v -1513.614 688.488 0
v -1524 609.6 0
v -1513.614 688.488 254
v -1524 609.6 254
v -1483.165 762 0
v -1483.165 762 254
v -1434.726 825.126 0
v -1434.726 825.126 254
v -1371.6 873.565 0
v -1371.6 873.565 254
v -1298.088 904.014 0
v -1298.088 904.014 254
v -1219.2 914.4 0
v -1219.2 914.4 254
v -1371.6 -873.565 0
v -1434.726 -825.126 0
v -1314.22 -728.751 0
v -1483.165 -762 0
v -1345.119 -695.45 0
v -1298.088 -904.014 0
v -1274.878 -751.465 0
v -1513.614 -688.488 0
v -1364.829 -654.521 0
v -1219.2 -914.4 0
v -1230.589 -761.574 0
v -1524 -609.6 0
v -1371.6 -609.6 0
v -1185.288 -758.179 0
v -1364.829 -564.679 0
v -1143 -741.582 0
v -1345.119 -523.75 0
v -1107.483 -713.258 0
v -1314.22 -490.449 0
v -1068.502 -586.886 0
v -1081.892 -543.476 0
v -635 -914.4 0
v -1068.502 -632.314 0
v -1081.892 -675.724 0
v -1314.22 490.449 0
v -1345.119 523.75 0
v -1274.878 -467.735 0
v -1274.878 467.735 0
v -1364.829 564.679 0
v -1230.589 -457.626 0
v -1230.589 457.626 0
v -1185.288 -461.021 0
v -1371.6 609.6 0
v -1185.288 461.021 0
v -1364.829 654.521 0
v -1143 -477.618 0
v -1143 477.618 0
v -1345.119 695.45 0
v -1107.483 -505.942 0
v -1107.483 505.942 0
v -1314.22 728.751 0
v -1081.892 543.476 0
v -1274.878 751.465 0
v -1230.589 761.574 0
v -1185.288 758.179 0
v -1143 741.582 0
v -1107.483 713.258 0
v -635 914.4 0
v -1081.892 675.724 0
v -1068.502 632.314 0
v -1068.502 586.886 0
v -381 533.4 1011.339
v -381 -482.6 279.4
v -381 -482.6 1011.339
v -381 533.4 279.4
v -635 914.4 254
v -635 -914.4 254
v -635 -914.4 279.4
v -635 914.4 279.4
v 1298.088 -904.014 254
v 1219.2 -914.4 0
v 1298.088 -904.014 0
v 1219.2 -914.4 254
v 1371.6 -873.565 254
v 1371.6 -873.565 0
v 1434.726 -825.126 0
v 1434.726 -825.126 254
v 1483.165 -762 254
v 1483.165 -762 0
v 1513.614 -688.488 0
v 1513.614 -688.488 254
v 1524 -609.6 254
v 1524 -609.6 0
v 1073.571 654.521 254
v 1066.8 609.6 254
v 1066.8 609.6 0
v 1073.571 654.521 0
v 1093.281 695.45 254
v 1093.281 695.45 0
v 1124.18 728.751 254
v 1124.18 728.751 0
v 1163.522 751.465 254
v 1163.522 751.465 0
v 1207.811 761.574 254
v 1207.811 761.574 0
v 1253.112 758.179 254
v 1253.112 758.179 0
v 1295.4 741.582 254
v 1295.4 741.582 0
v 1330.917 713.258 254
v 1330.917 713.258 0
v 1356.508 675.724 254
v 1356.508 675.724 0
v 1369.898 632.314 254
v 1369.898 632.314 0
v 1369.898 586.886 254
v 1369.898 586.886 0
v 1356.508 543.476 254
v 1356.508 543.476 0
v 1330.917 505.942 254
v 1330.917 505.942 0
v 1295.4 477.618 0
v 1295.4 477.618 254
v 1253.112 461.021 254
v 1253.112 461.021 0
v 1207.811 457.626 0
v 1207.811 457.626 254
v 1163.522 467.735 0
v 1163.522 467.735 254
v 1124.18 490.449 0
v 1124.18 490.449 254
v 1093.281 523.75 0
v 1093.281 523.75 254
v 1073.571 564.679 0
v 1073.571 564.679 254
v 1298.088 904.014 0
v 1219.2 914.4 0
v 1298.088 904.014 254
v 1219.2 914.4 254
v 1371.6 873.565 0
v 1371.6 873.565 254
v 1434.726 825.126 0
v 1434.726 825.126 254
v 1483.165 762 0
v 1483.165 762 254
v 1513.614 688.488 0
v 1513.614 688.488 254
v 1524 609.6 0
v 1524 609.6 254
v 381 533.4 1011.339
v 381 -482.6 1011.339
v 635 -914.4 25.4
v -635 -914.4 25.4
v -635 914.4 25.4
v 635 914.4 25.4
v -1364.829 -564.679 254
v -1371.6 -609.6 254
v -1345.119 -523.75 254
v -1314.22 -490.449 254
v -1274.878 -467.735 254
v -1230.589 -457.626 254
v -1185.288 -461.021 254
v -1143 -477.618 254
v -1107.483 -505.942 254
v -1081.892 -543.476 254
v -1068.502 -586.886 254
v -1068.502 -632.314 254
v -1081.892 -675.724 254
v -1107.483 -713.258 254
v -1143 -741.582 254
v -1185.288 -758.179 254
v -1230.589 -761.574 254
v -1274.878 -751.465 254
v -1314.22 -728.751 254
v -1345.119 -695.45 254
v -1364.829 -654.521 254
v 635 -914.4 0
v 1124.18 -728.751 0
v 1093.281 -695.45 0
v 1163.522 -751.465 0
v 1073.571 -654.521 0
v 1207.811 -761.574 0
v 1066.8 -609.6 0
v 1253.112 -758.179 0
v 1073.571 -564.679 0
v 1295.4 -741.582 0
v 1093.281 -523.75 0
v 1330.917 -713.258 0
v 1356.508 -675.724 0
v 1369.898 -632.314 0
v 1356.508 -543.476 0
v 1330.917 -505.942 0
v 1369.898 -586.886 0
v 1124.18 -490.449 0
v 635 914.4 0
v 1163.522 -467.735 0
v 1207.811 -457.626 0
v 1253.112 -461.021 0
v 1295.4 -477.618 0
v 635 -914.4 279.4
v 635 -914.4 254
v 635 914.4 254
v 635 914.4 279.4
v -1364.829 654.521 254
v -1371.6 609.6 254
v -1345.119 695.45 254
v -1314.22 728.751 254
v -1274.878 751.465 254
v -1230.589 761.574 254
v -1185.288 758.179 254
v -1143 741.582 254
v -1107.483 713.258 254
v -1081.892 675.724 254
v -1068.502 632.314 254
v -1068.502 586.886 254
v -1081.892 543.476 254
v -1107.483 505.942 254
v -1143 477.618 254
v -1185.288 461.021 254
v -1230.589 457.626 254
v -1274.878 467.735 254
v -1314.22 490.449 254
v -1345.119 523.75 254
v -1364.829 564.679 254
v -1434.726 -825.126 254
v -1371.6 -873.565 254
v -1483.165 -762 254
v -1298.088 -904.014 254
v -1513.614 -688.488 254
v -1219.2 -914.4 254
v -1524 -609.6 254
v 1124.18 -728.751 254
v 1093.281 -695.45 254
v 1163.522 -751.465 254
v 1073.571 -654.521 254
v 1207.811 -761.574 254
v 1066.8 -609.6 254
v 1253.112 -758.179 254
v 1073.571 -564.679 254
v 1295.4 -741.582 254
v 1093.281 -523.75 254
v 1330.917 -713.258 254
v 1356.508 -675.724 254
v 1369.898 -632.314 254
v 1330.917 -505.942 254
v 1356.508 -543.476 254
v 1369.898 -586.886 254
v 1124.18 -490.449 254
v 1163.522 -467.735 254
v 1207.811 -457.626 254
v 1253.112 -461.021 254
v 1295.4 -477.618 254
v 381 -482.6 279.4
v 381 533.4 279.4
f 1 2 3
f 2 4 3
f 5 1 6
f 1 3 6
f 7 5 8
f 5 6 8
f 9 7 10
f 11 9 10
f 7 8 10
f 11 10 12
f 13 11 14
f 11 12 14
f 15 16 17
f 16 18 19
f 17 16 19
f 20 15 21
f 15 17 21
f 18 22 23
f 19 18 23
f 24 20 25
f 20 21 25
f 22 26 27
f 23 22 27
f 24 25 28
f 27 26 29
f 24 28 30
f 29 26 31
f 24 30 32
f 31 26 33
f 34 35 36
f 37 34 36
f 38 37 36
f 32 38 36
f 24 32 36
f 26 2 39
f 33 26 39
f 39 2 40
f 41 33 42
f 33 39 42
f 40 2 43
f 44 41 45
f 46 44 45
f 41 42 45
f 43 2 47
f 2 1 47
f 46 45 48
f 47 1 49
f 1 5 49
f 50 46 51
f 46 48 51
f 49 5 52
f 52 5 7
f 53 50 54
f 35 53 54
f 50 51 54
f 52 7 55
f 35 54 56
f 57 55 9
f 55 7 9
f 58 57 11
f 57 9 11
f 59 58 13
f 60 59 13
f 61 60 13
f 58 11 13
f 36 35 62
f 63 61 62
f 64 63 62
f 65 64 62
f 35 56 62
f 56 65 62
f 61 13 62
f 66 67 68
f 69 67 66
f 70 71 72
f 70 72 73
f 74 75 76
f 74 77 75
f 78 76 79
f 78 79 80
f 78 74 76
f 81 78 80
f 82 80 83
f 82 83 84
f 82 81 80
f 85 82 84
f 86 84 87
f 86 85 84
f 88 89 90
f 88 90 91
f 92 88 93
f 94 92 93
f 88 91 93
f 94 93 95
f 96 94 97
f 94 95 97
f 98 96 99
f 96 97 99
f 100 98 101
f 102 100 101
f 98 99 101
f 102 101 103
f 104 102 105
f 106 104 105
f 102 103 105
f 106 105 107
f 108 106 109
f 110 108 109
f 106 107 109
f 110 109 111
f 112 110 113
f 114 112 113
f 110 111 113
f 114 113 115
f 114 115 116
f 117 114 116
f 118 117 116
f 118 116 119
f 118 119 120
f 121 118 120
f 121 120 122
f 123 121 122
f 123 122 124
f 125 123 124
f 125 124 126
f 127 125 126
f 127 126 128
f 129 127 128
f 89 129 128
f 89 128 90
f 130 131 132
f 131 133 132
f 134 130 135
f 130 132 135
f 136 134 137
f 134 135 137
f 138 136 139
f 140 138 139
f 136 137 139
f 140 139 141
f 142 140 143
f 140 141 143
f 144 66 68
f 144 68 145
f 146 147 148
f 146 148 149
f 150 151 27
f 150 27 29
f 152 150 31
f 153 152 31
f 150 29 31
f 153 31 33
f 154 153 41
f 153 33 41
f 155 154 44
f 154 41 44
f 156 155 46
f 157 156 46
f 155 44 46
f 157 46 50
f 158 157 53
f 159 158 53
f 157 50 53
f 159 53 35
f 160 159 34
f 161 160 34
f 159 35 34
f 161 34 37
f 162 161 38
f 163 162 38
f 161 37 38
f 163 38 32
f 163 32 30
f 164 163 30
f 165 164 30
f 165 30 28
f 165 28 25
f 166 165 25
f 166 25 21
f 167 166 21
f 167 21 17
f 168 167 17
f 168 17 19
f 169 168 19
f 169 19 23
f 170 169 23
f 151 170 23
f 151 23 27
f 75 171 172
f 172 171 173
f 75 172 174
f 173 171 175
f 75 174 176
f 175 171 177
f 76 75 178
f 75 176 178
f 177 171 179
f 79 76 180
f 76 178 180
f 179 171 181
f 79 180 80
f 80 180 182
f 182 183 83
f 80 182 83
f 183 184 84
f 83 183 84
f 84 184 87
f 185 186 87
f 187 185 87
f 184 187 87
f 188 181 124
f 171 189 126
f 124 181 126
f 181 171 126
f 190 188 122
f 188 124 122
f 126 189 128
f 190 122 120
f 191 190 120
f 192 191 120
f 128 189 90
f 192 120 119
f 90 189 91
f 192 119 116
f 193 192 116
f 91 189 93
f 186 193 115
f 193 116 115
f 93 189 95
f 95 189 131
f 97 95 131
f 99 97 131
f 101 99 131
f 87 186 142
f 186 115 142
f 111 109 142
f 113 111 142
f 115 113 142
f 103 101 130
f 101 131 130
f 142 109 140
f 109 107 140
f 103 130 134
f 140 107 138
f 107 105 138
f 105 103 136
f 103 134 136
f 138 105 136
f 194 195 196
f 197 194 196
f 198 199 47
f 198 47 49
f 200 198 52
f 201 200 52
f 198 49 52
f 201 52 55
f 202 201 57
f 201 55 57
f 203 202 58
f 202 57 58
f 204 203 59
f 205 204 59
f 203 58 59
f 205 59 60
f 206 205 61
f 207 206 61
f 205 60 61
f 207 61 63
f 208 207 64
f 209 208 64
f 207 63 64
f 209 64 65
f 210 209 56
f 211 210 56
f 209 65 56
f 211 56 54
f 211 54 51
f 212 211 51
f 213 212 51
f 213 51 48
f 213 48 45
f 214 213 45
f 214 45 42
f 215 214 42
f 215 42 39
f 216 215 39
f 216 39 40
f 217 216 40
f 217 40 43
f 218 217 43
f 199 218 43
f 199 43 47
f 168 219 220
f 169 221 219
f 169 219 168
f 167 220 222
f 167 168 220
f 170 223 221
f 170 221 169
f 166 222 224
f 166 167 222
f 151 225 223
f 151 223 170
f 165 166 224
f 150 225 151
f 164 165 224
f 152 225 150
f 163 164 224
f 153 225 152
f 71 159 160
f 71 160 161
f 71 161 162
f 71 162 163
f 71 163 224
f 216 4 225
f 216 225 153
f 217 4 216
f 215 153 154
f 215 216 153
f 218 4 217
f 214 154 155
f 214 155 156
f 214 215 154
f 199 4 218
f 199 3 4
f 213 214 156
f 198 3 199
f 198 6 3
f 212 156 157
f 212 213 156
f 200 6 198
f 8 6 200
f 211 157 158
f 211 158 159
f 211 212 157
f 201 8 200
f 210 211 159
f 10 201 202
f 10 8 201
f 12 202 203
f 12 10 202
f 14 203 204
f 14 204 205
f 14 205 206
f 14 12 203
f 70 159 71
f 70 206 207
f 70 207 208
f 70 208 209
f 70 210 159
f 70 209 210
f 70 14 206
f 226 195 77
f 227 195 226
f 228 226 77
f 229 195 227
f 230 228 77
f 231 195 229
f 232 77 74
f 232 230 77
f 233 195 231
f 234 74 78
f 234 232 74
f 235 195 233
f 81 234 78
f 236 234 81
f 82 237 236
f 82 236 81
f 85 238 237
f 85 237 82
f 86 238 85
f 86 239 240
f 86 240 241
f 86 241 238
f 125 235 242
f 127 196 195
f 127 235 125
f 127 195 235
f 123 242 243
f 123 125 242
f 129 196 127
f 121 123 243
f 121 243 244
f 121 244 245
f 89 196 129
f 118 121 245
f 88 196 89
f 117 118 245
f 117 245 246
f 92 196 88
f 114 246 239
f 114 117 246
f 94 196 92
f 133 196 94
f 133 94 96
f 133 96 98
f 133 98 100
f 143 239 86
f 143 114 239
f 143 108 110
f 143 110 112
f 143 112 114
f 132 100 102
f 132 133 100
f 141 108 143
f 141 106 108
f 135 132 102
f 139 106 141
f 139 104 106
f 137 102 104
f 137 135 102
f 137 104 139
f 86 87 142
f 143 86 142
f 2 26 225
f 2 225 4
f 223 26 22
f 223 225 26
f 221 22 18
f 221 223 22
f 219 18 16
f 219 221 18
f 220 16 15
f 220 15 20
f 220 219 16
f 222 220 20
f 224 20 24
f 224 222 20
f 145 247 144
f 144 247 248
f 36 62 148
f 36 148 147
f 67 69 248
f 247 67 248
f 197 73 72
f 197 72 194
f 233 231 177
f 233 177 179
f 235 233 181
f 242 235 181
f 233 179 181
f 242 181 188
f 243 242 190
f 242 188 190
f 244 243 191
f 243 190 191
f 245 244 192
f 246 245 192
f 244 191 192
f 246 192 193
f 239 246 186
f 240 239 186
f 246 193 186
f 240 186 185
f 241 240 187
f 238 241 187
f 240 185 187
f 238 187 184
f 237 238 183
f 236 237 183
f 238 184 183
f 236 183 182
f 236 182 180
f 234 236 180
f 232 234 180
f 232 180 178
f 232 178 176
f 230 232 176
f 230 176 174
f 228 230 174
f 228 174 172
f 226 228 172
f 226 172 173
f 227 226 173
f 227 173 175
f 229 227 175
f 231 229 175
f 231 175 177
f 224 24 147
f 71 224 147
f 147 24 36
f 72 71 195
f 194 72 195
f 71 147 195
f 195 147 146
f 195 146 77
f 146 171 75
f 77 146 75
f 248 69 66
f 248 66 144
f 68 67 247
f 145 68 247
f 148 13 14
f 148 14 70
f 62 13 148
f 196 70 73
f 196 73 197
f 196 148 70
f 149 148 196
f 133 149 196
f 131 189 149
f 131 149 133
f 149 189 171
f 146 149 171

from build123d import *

# Parameters (mm, degrees)
F0_W      = 3048
F0_H      = 1828.8
F1_DEPTH  = 254
F2_W      = 1270
F2_H      = 1828.8
F3_DEPTH  = 25.4
F4_W      = 1270
F4_H      = 1828.8
F5_DEPTH  = 25.4
F6_R      = 304.8
F9_D      = 304.8
F10_W     = 762
F10_H     = 1016
F11_DEPTH = 731.938975


with BuildPart() as f1:
    # F0 (on Top) → F1 (new body)
    with BuildSketch(Plane.XY):
        Rectangle(F0_W, F0_H)
    extrude(amount=F1_DEPTH)

    # F2 (on face) → F3 (join)
    with BuildSketch(Plane.XY.offset(254)):
        Rectangle(F2_W, F2_H)
    extrude(amount=F3_DEPTH)

    # F4 (on face) → F5 (cut)
    with BuildSketch(Plane(origin=(0, 0, 0), x_dir=(1, 0, 0), z_dir=(0, 0, -1))):
        Rectangle(F4_W, F4_H)
    extrude(amount=-F5_DEPTH, mode=Mode.SUBTRACT)

    # F6
    f6_edges = [f1.edges().sort_by_distance(p)[0] for p in [
        (1524, -914.4, 127),
        (1524, 914.4, 127),
        (-1524, -914.4, 127),
        (-1524, 914.4, 127),
    ]]
    fillet(f6_edges, radius=F6_R)

    # F9 (through all)
    with Locations(Plane.XY.offset(254)):
        with Locations((-1219.2, 609.6), (-1219.2, -609.6), (1219.2, 609.6), (1219.2, -609.6)):
            Hole(F9_D / 2)


with BuildPart() as f11:
    # F10 (on face) → F11 (new body)
    with BuildSketch(Plane.XY.offset(279.4)):
        with Locations((0, 25.4)):
            Rectangle(F10_W, F10_H)
    extrude(amount=F11_DEPTH)


solid = Compound([f1.part, f11.part])
